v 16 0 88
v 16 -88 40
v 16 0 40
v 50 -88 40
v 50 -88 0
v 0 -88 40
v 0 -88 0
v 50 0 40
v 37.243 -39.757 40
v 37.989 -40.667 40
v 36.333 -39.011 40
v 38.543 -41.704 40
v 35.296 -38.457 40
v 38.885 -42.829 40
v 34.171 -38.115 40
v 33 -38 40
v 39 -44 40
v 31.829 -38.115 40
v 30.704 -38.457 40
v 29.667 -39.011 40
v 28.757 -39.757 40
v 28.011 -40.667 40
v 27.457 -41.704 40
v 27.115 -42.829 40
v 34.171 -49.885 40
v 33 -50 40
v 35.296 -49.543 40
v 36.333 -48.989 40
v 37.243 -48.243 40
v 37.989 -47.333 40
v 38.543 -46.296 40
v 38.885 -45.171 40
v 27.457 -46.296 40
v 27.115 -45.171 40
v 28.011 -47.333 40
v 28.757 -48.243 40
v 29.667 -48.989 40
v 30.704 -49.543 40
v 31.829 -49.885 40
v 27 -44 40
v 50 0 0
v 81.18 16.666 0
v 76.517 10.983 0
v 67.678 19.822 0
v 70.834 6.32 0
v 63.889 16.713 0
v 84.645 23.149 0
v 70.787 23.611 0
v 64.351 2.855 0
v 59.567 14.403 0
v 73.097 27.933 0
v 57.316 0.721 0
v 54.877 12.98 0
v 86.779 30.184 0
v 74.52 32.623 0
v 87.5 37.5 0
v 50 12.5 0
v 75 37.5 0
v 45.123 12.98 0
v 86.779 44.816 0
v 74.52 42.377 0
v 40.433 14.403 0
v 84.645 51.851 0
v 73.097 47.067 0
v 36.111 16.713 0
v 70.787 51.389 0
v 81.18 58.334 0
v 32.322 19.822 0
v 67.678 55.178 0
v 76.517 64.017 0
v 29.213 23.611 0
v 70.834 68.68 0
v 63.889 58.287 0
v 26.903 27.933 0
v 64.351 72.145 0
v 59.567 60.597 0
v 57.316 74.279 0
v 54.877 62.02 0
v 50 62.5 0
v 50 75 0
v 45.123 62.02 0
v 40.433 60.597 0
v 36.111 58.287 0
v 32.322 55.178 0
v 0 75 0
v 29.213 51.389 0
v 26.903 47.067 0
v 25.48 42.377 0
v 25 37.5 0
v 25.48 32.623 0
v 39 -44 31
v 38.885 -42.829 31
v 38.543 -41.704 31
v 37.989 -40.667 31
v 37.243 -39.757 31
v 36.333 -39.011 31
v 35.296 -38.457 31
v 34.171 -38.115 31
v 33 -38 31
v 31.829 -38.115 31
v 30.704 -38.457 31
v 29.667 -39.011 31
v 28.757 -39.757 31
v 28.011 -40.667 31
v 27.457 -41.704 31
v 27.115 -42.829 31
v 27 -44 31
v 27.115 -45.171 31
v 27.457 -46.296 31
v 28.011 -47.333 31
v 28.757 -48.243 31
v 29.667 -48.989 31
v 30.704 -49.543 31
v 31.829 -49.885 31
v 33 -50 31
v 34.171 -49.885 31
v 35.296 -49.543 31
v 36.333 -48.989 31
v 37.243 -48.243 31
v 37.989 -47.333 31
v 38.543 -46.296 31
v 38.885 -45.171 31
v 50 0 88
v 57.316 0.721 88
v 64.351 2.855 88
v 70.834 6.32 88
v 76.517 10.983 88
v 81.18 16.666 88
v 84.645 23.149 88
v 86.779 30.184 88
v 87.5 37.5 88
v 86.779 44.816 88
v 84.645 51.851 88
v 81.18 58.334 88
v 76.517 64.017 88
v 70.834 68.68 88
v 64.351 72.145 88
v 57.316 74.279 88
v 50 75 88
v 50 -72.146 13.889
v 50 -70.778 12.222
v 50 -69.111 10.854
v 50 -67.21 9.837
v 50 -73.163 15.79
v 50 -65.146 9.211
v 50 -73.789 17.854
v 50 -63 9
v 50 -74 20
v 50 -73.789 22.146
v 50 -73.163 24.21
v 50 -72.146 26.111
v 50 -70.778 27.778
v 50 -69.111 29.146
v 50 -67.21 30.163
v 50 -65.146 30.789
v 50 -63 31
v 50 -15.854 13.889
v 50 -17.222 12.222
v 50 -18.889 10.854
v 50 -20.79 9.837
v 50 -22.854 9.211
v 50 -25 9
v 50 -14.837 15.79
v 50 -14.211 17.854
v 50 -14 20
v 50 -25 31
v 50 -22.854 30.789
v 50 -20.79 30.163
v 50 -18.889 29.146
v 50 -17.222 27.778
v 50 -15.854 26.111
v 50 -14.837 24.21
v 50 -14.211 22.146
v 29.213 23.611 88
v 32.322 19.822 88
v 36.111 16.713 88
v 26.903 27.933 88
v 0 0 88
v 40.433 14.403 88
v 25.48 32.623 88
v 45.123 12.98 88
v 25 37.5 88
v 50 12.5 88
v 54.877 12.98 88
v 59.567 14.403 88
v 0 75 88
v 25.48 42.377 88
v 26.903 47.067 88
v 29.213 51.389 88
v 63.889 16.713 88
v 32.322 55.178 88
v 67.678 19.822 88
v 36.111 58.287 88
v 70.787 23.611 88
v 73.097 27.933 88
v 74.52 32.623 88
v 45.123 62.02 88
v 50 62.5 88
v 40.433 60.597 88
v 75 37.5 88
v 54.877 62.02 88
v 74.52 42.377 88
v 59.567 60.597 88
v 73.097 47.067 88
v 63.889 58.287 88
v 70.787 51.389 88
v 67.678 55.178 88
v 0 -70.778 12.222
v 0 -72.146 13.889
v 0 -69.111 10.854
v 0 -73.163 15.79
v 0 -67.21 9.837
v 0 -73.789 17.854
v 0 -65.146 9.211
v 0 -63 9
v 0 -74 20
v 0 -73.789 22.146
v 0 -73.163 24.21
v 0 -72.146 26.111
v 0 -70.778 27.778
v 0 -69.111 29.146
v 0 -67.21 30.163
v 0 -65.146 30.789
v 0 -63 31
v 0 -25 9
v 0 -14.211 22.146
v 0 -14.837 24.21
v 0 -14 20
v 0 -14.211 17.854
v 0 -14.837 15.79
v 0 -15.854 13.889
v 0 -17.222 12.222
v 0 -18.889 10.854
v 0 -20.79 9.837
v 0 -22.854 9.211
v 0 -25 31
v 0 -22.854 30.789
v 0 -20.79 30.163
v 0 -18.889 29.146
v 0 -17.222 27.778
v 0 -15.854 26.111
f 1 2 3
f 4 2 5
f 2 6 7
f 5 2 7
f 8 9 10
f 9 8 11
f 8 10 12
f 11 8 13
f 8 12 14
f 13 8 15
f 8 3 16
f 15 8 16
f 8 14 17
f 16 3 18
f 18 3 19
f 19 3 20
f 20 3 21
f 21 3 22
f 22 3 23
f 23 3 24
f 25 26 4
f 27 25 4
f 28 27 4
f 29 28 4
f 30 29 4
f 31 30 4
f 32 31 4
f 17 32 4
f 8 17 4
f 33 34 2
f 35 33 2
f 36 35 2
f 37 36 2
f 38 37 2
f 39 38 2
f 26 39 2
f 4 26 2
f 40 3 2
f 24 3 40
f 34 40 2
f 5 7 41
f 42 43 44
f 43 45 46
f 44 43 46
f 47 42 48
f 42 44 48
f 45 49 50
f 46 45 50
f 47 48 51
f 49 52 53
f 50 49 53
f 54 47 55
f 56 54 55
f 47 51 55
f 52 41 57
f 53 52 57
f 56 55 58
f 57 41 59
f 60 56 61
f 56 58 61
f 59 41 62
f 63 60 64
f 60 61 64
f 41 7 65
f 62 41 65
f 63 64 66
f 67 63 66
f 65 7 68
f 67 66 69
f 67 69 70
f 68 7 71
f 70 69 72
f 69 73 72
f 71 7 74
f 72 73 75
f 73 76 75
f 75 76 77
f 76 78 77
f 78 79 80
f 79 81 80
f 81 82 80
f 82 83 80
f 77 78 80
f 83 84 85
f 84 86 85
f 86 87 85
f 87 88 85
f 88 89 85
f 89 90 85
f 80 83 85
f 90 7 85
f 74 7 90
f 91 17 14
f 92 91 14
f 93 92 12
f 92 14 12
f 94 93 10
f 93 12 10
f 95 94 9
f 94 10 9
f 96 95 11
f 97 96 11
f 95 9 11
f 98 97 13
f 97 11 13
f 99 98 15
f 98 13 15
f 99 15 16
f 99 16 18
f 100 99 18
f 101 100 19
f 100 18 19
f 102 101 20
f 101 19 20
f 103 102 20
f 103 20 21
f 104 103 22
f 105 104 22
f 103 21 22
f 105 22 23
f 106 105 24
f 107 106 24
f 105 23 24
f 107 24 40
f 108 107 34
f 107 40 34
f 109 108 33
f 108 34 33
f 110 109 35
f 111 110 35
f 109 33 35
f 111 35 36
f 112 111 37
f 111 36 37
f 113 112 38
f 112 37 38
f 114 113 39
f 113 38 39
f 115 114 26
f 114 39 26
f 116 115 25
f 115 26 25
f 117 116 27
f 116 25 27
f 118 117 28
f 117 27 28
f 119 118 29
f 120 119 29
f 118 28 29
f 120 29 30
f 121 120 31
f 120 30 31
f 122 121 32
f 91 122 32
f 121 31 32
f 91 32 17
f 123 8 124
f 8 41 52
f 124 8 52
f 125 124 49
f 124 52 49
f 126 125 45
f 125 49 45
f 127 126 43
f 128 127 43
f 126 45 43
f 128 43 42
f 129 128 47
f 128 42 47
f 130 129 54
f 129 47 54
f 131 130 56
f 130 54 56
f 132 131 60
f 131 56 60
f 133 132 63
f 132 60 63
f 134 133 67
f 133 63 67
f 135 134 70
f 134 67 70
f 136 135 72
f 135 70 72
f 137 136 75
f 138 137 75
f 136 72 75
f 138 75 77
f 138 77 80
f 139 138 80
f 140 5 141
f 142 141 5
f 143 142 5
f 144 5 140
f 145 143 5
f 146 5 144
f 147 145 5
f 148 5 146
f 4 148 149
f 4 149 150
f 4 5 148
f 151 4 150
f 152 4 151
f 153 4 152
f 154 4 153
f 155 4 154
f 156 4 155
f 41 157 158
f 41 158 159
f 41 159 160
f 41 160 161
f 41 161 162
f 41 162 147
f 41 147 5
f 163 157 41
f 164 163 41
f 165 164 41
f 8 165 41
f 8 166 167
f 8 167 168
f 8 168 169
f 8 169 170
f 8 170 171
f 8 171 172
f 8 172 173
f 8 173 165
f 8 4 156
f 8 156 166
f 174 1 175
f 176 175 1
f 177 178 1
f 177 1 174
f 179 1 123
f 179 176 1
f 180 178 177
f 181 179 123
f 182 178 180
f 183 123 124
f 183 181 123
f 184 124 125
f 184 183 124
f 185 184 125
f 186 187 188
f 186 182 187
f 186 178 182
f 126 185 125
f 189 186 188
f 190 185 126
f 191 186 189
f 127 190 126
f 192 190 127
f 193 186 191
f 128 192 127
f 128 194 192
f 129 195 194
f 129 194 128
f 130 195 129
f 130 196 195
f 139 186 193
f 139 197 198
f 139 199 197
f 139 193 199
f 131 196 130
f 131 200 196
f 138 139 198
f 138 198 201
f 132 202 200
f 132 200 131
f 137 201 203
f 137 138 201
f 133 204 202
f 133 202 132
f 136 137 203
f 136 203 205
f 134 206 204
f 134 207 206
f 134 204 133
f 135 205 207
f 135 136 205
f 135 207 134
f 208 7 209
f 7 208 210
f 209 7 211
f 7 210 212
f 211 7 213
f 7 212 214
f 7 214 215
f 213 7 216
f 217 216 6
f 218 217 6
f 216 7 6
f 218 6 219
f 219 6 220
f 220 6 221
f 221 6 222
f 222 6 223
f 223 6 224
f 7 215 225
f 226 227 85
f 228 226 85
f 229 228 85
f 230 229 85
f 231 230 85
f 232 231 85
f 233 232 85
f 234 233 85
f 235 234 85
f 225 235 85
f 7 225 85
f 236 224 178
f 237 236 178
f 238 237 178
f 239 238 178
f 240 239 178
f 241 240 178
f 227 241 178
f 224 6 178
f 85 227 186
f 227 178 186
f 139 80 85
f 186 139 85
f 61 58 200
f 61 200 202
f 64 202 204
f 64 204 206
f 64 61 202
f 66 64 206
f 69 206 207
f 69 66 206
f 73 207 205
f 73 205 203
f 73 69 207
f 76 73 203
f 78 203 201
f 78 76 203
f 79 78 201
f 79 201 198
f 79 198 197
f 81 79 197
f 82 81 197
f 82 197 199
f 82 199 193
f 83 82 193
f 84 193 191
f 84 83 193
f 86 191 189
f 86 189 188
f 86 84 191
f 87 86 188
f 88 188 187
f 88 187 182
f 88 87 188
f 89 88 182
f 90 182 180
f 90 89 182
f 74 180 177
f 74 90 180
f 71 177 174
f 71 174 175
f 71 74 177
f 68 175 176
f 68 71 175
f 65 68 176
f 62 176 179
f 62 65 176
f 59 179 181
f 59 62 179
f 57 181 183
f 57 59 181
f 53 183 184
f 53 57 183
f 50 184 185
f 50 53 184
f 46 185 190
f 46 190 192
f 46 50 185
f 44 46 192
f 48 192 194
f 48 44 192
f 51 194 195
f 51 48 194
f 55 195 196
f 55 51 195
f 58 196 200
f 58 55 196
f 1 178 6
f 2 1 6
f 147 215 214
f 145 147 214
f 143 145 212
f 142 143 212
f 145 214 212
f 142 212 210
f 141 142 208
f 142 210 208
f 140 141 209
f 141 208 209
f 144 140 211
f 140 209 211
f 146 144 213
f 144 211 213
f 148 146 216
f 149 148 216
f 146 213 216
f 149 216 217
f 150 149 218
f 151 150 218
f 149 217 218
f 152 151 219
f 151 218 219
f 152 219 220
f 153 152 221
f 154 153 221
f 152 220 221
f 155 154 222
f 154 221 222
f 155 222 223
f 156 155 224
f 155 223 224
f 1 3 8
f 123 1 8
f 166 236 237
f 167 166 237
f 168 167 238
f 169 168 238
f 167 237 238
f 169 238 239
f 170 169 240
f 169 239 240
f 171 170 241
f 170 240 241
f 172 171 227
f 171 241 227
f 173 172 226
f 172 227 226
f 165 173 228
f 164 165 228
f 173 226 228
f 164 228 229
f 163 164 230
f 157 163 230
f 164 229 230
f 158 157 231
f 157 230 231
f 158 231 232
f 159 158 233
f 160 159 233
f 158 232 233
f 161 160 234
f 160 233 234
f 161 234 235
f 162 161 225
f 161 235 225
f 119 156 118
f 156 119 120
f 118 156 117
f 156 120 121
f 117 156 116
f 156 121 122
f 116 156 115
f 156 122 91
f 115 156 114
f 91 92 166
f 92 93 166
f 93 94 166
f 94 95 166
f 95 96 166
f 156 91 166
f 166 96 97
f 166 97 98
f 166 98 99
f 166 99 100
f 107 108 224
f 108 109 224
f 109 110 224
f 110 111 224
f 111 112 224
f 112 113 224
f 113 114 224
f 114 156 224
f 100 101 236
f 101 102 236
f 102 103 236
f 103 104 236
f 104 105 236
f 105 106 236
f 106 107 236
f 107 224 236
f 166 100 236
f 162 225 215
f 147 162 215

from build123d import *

# Parameters (mm, degrees)
F0_R     = 25
F1_DEPTH = 88
F3_DEPTH = 50
F5_DEPTH = 16
F7_R     = 6
F8_DEPTH = 9


with BuildPart() as f1:
    # F0 (on Top) → F1 (new body)
    with BuildSketch(Plane.XY):
        with BuildLine():
            Line((0, 75), (0, 0))
            Line((0, 0), (50, 0))
            ThreePointArc((50, 0), (87.5, 37.5), (50, 75))
            Line((50, 75), (0, 75))
        make_face()
        with Locations((50, 37.5)):
            Circle(F0_R, mode=Mode.SUBTRACT)
    extrude(amount=F1_DEPTH)

    # F2 (on Right) → F3 (join)
    with BuildSketch(Plane.YZ):
        Polygon((-25, 0), (0, 0), (0, 40), (-88, 40), (-88, 0), align=None)
        with BuildLine():
            ThreePointArc((-25, 31), (-14, 20), (-25, 9))
            Line((-25, 9), (-63, 9))
            ThreePointArc((-63, 9), (-74, 20), (-63, 31))
            Line((-63, 31), (-25, 31))
        make_face(mode=Mode.SUBTRACT)
    extrude(amount=F3_DEPTH)

    # F4 (on Right) → F5 (join)
    with BuildSketch(Plane.YZ):
        Polygon((-88, 40), (0, 40), (0, 88), align=None)
    extrude(amount=F5_DEPTH)

    # F7 (on face) → F8 (cut, through all)
    with BuildSketch(Plane.XY.offset(40)):
        with Locations((33, -44)):
            Circle(F7_R)
    extrude(amount=-F8_DEPTH, mode=Mode.SUBTRACT)


solid = f1.part
